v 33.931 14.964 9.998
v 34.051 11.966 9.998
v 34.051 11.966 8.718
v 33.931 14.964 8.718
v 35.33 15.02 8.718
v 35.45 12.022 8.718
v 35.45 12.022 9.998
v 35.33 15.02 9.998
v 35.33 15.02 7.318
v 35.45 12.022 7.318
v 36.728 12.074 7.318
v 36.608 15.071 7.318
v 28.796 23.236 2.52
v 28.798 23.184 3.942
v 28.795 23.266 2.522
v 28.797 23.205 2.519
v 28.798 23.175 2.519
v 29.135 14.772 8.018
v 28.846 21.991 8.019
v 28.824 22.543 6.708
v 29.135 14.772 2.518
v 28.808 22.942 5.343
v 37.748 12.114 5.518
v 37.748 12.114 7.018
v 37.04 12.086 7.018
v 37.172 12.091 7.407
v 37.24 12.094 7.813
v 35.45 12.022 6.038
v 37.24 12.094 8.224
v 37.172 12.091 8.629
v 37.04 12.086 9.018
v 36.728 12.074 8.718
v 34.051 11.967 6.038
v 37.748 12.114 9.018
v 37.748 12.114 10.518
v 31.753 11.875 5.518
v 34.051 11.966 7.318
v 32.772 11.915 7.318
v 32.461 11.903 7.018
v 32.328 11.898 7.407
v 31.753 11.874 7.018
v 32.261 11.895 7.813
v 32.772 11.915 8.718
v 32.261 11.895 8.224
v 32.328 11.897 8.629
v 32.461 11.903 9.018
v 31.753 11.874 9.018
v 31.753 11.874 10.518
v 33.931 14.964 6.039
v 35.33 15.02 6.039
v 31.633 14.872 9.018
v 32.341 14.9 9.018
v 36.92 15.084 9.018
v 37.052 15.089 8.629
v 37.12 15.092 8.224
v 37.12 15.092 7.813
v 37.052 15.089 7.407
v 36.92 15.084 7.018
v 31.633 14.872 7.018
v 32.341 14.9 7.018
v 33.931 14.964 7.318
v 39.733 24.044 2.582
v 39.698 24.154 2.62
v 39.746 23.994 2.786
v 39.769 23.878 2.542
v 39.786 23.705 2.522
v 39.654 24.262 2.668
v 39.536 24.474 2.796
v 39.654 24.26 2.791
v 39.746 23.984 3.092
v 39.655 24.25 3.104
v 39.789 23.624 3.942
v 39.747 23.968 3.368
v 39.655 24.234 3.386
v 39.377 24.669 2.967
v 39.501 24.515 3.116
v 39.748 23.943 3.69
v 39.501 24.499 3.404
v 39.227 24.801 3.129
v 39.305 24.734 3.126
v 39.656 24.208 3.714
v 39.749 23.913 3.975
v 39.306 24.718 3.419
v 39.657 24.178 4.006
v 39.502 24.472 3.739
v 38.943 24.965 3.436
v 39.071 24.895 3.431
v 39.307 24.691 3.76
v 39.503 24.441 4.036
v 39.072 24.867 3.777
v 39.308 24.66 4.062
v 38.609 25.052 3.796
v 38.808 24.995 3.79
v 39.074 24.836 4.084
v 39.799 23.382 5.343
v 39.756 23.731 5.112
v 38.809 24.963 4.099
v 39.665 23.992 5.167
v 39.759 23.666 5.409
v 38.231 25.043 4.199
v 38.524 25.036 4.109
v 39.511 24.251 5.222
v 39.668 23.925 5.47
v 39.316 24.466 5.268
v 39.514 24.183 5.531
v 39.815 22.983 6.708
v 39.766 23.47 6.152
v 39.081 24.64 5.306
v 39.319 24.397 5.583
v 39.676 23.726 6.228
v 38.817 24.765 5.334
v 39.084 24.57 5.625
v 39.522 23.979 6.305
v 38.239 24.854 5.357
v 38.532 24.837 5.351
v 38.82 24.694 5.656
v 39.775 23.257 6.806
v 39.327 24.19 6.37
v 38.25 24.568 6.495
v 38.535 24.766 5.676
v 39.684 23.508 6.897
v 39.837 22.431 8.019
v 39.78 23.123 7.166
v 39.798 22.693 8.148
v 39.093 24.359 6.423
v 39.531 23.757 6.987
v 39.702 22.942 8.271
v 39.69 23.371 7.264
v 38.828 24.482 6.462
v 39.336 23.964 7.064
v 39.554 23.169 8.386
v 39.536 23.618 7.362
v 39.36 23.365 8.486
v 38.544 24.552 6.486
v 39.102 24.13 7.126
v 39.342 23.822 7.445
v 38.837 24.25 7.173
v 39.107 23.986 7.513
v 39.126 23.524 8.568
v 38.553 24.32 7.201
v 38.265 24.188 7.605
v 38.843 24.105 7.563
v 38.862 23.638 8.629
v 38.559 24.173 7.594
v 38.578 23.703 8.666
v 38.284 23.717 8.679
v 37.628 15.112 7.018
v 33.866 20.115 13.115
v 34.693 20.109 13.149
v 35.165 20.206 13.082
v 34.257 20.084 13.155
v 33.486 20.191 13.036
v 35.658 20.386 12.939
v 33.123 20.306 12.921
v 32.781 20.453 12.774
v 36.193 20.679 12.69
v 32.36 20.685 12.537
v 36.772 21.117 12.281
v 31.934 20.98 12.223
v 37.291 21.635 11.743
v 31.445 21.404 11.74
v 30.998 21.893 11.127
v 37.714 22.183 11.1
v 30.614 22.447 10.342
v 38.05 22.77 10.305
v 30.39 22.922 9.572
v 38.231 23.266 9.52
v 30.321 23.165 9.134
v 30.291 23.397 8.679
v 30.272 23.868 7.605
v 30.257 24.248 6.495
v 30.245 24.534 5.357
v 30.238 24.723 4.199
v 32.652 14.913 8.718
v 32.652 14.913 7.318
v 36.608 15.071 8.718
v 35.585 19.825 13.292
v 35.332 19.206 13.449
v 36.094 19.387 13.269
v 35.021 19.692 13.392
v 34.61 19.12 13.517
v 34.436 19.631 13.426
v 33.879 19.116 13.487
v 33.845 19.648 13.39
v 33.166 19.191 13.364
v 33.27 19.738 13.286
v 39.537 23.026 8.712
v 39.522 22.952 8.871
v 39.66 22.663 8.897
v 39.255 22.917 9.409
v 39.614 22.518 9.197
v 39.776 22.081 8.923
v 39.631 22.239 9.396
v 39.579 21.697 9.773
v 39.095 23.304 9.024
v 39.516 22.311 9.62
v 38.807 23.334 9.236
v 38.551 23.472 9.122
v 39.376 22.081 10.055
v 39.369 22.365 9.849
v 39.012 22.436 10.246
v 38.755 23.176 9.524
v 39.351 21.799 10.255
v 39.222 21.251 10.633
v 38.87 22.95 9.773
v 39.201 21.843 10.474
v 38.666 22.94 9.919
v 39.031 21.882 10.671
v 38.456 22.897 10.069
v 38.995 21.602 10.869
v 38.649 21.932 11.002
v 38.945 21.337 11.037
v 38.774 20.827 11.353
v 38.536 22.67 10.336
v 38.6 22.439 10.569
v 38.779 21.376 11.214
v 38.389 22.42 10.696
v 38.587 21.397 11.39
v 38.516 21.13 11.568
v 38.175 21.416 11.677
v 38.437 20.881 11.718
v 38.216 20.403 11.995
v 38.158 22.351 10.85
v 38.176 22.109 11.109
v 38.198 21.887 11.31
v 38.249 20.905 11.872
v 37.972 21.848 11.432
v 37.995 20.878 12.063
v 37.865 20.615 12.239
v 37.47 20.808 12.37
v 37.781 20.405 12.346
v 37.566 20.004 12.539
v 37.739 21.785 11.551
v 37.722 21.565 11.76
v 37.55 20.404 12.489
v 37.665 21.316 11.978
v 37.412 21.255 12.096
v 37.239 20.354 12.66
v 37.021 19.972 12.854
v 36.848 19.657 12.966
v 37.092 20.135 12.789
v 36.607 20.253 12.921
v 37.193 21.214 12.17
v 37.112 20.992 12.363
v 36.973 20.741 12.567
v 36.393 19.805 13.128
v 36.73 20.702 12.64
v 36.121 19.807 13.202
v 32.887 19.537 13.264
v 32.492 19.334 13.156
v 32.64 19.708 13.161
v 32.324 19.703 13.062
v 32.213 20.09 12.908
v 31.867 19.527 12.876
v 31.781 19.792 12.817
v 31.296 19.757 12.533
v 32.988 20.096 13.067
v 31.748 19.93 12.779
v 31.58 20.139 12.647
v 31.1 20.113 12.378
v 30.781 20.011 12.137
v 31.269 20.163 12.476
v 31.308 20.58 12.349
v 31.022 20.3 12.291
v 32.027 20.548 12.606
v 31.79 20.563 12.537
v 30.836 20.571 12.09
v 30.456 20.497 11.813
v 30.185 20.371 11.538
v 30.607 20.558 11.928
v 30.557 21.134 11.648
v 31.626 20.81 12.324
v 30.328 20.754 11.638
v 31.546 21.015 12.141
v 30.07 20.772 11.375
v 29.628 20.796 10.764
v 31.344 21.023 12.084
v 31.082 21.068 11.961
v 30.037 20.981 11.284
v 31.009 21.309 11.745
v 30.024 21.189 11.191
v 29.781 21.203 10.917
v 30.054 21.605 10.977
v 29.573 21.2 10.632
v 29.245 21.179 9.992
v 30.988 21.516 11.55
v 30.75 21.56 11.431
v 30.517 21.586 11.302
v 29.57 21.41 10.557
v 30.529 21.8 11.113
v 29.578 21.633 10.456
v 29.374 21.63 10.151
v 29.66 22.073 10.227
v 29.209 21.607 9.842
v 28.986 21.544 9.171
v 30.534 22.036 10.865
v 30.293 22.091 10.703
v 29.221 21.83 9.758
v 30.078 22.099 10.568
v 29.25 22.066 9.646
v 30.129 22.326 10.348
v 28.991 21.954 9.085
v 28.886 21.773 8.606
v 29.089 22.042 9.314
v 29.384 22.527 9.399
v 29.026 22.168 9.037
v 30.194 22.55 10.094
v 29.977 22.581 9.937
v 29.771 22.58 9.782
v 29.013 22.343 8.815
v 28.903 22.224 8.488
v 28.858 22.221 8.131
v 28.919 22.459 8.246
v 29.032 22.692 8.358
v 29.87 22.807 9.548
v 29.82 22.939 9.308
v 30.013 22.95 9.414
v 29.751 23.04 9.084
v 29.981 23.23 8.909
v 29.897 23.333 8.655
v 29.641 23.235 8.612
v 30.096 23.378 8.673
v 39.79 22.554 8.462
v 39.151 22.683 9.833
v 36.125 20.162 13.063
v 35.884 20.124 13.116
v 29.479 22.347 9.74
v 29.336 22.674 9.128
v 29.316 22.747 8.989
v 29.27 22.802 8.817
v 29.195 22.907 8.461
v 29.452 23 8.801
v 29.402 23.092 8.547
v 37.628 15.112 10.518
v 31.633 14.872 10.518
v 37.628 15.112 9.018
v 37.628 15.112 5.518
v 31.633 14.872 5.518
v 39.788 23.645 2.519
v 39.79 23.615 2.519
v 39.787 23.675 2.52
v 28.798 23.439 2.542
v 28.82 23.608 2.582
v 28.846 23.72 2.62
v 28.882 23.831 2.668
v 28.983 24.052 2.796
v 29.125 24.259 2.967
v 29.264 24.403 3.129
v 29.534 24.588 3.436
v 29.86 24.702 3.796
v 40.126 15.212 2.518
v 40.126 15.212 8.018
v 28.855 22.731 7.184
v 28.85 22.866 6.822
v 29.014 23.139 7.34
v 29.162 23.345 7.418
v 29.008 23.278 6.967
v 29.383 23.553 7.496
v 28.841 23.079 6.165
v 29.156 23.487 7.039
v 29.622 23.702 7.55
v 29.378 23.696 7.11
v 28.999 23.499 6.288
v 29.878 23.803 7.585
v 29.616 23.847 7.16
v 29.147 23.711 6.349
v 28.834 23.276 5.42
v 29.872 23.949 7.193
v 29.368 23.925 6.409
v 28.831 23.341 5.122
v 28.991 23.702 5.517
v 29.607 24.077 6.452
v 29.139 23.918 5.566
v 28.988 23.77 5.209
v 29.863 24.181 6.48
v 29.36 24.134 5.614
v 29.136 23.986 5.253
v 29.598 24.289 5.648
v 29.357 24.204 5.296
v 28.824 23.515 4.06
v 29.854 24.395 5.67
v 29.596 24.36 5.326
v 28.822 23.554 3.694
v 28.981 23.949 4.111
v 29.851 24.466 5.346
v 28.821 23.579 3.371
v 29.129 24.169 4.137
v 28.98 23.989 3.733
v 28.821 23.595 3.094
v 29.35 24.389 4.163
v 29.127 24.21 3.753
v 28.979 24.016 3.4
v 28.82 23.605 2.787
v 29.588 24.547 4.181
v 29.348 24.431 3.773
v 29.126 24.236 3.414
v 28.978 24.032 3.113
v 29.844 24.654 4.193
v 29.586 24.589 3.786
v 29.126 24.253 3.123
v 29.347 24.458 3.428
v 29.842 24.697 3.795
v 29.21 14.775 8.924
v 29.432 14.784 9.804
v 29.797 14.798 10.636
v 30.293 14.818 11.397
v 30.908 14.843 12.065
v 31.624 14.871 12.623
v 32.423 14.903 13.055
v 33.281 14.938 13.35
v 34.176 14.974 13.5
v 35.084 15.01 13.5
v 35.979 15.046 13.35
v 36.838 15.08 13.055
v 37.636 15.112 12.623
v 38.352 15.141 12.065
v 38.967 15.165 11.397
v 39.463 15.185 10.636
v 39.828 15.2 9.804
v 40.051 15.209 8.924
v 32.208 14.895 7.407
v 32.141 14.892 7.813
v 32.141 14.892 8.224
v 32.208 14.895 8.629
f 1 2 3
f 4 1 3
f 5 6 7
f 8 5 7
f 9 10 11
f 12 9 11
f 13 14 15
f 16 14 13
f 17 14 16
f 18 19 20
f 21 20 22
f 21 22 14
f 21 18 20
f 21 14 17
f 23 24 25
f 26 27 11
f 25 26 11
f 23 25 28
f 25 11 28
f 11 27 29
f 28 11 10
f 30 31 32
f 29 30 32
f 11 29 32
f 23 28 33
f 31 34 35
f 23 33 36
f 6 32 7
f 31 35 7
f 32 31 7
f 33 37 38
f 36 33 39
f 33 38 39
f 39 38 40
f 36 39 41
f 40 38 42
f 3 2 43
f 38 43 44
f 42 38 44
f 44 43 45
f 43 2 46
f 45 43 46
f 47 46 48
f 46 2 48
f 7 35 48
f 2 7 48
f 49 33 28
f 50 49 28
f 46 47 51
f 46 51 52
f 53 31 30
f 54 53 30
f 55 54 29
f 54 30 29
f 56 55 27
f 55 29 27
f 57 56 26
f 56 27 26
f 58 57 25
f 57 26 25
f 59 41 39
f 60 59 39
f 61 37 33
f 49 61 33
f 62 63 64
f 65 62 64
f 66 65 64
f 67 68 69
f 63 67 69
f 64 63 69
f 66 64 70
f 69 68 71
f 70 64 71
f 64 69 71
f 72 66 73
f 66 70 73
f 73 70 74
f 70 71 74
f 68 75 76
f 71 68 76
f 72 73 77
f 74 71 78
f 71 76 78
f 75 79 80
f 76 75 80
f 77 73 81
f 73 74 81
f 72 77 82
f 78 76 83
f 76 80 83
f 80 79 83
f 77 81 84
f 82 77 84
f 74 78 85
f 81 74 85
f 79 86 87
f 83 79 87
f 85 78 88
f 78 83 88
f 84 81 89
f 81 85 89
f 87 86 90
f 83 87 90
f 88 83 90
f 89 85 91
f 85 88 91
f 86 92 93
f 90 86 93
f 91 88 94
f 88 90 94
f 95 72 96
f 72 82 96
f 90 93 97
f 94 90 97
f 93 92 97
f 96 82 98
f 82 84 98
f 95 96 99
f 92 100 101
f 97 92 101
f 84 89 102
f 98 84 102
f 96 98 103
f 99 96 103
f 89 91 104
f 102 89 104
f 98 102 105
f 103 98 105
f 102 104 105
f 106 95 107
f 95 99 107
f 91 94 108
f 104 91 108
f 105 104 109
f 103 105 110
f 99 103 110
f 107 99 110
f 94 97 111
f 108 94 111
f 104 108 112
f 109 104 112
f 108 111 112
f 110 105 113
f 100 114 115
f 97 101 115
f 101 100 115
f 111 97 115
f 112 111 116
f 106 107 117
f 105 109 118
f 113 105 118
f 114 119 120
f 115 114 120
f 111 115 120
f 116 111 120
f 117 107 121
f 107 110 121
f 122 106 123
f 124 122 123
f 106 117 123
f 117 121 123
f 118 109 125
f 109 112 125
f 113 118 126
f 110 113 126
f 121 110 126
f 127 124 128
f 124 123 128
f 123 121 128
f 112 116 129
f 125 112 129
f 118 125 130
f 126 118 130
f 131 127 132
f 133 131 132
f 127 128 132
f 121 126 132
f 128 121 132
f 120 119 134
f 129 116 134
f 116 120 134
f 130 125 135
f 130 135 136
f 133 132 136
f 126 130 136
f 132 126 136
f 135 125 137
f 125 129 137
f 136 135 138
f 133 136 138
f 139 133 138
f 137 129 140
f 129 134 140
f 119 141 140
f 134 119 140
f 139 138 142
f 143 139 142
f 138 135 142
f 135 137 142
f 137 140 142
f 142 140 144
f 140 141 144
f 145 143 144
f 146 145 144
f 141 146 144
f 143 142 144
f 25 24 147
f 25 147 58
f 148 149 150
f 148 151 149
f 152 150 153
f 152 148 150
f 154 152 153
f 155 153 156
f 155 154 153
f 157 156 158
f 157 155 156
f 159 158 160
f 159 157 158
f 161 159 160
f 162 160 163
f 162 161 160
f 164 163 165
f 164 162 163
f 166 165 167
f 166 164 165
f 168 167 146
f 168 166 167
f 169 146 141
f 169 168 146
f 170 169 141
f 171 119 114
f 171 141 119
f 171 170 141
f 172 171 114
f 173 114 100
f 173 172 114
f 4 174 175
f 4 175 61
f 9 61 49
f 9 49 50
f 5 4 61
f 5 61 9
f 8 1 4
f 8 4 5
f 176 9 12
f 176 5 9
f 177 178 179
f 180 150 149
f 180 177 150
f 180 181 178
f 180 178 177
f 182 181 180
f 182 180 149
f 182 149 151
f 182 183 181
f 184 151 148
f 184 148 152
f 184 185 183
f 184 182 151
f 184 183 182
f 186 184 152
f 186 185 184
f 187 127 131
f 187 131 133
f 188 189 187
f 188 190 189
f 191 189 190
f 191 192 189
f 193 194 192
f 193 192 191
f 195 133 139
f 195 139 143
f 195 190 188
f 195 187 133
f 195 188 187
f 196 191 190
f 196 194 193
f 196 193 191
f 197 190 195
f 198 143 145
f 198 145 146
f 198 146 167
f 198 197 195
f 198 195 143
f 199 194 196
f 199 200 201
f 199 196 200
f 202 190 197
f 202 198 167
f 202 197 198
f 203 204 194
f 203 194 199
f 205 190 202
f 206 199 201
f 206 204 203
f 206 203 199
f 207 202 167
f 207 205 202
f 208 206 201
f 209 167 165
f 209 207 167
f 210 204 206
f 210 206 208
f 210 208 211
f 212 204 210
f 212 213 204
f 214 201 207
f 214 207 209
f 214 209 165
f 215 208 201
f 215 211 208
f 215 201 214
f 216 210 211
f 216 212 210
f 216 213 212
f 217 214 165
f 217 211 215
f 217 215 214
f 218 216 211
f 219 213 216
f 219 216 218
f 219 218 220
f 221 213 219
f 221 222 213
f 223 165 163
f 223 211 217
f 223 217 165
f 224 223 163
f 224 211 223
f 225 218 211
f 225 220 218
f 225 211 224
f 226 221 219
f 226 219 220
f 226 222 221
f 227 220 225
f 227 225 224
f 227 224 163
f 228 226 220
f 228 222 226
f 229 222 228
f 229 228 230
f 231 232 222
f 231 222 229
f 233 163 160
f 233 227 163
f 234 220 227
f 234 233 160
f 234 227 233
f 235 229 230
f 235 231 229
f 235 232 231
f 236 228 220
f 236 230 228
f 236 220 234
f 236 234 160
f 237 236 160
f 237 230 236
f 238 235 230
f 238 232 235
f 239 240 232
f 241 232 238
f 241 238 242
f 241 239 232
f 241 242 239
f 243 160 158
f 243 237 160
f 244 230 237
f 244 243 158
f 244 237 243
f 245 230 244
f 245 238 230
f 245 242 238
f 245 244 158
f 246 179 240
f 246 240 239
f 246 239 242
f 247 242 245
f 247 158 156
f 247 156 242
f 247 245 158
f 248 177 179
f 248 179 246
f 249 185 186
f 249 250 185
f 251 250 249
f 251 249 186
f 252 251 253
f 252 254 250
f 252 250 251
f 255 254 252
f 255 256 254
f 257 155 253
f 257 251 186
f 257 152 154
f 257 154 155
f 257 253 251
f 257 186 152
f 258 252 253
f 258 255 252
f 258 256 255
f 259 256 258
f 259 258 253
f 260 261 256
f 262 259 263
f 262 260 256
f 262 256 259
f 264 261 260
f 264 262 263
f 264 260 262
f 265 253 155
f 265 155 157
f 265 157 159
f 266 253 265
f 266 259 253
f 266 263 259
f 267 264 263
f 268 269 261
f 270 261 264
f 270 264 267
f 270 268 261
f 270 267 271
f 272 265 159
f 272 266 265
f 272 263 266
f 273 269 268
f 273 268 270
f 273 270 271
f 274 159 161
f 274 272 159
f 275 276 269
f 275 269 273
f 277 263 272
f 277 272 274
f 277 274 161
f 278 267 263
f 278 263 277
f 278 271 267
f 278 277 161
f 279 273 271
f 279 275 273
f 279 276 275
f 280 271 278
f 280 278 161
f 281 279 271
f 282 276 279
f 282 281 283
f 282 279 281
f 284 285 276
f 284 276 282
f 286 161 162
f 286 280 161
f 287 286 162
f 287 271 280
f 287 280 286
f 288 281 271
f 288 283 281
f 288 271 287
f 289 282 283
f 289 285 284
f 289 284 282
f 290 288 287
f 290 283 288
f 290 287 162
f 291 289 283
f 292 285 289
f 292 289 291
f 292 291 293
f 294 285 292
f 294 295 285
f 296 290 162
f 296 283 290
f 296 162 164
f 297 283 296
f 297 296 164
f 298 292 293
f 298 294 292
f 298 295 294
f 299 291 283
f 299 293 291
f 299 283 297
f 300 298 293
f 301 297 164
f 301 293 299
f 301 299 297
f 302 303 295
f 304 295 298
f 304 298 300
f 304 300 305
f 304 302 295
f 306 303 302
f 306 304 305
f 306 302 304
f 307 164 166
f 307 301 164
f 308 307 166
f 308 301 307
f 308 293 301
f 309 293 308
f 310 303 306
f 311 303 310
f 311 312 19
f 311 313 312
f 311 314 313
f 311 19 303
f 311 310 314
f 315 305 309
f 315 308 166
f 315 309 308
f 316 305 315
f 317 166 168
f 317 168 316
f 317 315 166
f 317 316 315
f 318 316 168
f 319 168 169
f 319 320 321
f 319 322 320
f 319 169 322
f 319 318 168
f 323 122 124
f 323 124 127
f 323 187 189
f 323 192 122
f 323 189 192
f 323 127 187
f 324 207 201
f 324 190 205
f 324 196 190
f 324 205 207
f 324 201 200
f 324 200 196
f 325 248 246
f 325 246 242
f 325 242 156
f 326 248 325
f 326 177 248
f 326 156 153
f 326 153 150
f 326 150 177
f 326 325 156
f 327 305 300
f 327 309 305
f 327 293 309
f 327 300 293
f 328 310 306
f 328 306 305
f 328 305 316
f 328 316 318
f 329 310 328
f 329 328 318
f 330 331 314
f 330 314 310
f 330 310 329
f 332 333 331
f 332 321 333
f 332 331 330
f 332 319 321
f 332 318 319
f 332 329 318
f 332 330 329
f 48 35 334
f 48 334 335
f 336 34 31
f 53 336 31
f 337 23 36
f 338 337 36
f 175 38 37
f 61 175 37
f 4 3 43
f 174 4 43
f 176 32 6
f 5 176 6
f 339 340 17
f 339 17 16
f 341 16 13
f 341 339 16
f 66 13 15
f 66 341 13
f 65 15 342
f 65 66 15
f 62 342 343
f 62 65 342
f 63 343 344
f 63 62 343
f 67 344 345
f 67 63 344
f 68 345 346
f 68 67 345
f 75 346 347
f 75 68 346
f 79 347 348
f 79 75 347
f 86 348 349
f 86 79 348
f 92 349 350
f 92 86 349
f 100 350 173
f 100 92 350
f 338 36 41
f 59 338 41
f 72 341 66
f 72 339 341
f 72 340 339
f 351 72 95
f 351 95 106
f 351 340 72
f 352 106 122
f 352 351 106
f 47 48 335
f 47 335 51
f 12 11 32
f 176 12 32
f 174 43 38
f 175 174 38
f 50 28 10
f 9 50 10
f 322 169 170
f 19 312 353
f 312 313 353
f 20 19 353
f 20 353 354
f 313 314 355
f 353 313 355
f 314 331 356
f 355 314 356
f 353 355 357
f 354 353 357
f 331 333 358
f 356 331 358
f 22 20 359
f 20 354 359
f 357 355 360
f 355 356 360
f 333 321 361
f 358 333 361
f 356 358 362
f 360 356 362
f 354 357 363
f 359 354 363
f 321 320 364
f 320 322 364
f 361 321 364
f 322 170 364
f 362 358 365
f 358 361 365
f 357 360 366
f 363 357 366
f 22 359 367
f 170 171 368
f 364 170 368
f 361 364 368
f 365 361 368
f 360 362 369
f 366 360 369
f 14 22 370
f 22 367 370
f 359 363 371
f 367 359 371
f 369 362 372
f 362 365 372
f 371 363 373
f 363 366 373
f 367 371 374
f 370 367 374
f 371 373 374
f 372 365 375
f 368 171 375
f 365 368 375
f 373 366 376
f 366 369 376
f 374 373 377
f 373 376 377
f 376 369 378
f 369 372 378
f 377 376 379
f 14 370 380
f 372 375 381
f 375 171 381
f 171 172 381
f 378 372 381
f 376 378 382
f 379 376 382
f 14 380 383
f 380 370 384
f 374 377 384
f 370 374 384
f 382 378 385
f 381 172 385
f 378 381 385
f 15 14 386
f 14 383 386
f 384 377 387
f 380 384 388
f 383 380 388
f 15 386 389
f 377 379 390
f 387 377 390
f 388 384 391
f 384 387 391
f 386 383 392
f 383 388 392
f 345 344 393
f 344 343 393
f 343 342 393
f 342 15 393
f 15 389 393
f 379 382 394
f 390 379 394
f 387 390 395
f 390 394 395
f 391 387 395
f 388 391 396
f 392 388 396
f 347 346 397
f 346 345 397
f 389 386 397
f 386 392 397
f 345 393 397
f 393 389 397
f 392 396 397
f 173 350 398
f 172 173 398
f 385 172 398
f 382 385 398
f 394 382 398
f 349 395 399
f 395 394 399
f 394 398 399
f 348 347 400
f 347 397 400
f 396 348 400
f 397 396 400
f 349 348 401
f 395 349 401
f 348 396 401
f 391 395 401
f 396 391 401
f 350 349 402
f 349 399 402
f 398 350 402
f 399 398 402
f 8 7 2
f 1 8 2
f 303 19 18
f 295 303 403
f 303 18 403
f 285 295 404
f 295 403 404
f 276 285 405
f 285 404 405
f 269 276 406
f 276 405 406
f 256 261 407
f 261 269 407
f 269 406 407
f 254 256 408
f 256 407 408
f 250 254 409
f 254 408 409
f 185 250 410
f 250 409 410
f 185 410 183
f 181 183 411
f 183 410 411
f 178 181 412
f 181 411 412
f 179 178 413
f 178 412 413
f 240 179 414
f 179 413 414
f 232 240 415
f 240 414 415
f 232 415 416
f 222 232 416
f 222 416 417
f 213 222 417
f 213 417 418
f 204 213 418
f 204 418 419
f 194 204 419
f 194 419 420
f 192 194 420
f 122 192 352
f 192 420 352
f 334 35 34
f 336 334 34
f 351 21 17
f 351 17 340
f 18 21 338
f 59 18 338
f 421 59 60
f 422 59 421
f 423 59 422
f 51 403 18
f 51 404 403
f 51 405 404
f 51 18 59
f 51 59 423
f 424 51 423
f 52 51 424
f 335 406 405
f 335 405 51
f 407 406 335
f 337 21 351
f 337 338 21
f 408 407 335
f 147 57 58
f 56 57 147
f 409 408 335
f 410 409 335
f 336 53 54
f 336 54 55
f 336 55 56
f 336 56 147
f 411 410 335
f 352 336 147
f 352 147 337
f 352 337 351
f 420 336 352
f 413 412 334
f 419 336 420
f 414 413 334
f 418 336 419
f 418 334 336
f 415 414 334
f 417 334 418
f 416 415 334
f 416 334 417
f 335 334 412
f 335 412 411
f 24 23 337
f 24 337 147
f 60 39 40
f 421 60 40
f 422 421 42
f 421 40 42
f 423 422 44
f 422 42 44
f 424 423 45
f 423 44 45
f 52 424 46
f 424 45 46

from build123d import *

# Parameters (mm, degrees)
PAD112_DEPTH               = 3
PAD126_DEPTH               = 10
POCKET064_DEPTH            = 5.5
FILLET009_R                = 1.5
BODY181005_ROLL_ANGLE      = 89.997092
BODY181005_PITCH_ANGLE     = 5.8e-05
BODY181005_PLACEMENT_ANGLE = -177.708532


with BuildPart() as part:
    # Sketch208 → Pad112 (new body)
    with BuildSketch(Plane.XY):
        with BuildLine():
            ThreePointArc((-2.291288, 1), (-2.5, 0), (-2.291288, -1))
            Line((-3, -1), (-2.291288, -1))
            Line((-3, -2.5), (-3, -1))
            Line((-3, -2.5), (3, -2.5))
            Line((3, -2.5), (3, -1))
            Line((3, -1), (2.291288, -1))
            ThreePointArc((2.291288, -1), (2.5, 0), (2.291288, 1))
            Line((3, 1), (2.291288, 1))
            Line((3, 2.5), (3, 1))
            Line((-3, 2.5), (3, 2.5))
            Line((-3, 2.5), (-3, 1))
            Line((-3, 1), (-2.291288, 1))
        make_face()
        Polygon((-1.979899, 0.7), (-0.7, 0.7), (-0.7, 1.979899), (0.7, 1.979899), (0.7, 0.7), (1.979899, 0.7), (1.979899, -0.7), (0.7, -0.7), (0.7, -1.979899), (-0.7, -1.979899), (-0.7, -0.7), (-1.979899, -0.7), align=None, mode=Mode.SUBTRACT)
    extrude(amount=PAD112_DEPTH)


with BuildPart() as part_1:
    # Body167 placement: moved
    add(part.part.moved(Location((0, 0, 6))))

    # Sketch240 → Pad126 (new body)
    with BuildSketch(Plane.XY.offset(9)):
        with BuildLine():
            Line((5.5, 0), (5.5, -5.5))
            Line((5.5, -5.5), (-5.5, -5.5))
            Line((-5.5, -5.5), (-5.5, 0))
            ThreePointArc((5.5, 0), (0, 5.5), (-5.5, 0))
        make_face()
    extrude(amount=PAD126_DEPTH)

    # Sketch241 → Pocket064 (cut, symmetric)
    with BuildSketch(Plane(origin=(0, -5.5, 5), x_dir=(0, 1, 0), z_dir=(1, 0, 0))):
        with BuildLine():
            ThreePointArc((14, 0), (9.899495, 9.899495), (0, 14))
            Line((0, 14), (14, 14))
            Line((14, 14), (14, 0))
        make_face()
    extrude(amount=POCKET064_DEPTH, both=True, mode=Mode.SUBTRACT)

    # Fillet009
    fillet009_edges = [part_1.edges().sort_by_distance(p)[0] for p in [
        (5.5, -2.693, 18.715712),
        (0, 5.5, 13.660254),
        (-5.5, -2.693, 18.715712),
        (0, -5.5, 19),
    ]]
    fillet(fillet009_edges, radius=FILLET009_R)


with BuildPart() as part_2:
    # Body181005 roll: moved
    add(part_1.part.rotate(Axis((0, 0, 0), (1, 0, 0)), BODY181005_ROLL_ANGLE))


with BuildPart() as part_3:
    # Body181005 pitch: moved
    add(part_2.part.rotate(Axis((0, 0, 0), (0, 1, 0)), BODY181005_PITCH_ANGLE))


with BuildPart() as part_4:
    # Body181005 placement: moved
    add(part_3.part.moved(Location((34.990016, 5.999193, 8.017979))).rotate(Axis((34.990016, 5.999193, 8.017979), (0, 0, 1)), BODY181005_PLACEMENT_ANGLE))


solid = part_4.part
